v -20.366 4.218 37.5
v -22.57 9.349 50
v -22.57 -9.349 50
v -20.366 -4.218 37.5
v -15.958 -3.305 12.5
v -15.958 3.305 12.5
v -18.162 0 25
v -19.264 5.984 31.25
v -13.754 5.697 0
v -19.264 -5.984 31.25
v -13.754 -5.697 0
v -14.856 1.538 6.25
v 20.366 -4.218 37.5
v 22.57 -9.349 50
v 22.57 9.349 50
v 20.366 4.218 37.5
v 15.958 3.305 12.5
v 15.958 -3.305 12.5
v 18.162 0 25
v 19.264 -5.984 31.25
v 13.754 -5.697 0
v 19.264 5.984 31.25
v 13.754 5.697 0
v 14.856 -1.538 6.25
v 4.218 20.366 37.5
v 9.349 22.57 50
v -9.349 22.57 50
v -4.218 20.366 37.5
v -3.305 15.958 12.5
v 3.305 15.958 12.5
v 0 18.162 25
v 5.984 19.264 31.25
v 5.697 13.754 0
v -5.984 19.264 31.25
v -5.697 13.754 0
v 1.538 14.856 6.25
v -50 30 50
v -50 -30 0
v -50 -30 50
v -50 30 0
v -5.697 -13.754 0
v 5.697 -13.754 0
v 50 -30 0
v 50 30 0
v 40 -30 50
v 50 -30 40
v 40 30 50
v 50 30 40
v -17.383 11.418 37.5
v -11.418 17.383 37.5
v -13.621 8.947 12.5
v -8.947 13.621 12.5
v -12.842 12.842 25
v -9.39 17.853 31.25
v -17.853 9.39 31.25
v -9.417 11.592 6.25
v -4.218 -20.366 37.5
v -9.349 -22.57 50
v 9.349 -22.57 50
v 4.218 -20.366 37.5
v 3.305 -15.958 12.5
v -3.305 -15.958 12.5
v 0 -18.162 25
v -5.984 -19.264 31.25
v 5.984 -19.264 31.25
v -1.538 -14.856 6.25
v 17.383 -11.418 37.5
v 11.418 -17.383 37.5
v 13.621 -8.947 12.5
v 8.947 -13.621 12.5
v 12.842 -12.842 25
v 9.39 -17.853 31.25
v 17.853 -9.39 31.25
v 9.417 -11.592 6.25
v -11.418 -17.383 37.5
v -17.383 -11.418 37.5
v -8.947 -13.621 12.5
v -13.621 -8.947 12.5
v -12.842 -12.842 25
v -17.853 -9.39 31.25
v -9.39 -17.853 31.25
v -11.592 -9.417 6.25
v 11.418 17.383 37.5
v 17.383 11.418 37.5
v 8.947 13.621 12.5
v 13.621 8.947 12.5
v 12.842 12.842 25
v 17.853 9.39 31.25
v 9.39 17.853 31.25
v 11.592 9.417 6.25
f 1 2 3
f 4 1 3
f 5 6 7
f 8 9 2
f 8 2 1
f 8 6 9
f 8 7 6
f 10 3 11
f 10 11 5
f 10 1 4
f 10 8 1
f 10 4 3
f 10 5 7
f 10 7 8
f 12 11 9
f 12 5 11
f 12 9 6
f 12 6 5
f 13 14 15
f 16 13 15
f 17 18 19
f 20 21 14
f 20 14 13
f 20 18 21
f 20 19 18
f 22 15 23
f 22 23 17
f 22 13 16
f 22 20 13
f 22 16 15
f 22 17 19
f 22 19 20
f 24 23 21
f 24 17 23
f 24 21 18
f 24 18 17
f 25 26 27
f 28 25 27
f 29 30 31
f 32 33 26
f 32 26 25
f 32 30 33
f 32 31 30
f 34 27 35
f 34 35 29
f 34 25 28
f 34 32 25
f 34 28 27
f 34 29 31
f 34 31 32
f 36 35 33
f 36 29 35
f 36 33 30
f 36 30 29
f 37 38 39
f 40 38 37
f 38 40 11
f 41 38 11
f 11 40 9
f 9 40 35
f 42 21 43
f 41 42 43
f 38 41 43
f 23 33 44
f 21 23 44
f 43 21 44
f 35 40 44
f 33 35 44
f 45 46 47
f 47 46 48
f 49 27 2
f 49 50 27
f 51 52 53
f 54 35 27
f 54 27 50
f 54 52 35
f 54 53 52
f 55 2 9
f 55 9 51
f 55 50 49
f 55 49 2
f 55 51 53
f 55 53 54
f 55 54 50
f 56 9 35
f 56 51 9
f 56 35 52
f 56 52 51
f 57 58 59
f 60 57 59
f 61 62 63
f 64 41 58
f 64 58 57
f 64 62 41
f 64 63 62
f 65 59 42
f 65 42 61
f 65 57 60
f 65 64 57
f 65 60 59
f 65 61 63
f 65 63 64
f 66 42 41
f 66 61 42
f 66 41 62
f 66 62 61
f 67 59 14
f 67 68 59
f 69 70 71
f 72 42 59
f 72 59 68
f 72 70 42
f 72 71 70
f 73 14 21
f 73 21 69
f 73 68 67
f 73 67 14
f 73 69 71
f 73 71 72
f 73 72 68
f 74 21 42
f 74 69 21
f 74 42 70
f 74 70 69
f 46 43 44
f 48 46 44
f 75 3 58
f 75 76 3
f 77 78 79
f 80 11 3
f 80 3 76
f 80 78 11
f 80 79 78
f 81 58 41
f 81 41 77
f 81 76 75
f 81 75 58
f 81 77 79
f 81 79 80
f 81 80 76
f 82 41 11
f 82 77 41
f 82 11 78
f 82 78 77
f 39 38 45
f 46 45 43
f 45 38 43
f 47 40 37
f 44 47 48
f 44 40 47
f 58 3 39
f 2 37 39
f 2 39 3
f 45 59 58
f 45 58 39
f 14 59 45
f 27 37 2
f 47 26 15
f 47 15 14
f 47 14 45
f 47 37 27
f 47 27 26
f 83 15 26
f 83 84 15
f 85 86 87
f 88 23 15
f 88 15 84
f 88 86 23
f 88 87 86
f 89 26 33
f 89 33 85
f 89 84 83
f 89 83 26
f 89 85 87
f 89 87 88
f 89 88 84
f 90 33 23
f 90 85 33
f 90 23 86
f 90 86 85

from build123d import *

# Parameters (mm, degrees)
F0_W     = 100
F0_H     = 60
F1_DEPTH = 50
F5_SIZE  = 10


with BuildPart() as f1:
    # F0 (on Top) → F1 (new body)
    with BuildSketch(Plane.XY):
        Rectangle(F0_W, F0_H)
    extrude(amount=F1_DEPTH)

    # F2 (on face) → F4 section 0
    with BuildSketch(Plane.XY.offset(50)):
        Polygon((9.348642, 22.569619), (-9.348642, 22.569619), (-22.569619, 9.348642), (-22.569619, -9.348642), (-9.348642, -22.569619), (9.348642, -22.569619), (22.569619, -9.348642), (22.569619, 9.348642), align=None)
    # F3 (on face) → F4 section 1
    with BuildSketch(Plane(origin=(0, 0, 0), x_dir=(1, 0, 0), z_dir=(0, 0, -1))):
        Polygon((-13.753892, 5.697049), (-13.753892, -5.697049), (-5.697049, -13.753892), (5.697049, -13.753892), (13.753892, -5.697049), (13.753892, 5.697049), (5.697049, 13.753892), (-5.697049, 13.753892), align=None)
    loft(mode=Mode.SUBTRACT)

    # F5
    f5_edges = [f1.edges().sort_by_distance(p)[0] for p in [
        (50, 0, 50),
    ]]
    chamfer(f5_edges, length=F5_SIZE)


solid = f1.part
